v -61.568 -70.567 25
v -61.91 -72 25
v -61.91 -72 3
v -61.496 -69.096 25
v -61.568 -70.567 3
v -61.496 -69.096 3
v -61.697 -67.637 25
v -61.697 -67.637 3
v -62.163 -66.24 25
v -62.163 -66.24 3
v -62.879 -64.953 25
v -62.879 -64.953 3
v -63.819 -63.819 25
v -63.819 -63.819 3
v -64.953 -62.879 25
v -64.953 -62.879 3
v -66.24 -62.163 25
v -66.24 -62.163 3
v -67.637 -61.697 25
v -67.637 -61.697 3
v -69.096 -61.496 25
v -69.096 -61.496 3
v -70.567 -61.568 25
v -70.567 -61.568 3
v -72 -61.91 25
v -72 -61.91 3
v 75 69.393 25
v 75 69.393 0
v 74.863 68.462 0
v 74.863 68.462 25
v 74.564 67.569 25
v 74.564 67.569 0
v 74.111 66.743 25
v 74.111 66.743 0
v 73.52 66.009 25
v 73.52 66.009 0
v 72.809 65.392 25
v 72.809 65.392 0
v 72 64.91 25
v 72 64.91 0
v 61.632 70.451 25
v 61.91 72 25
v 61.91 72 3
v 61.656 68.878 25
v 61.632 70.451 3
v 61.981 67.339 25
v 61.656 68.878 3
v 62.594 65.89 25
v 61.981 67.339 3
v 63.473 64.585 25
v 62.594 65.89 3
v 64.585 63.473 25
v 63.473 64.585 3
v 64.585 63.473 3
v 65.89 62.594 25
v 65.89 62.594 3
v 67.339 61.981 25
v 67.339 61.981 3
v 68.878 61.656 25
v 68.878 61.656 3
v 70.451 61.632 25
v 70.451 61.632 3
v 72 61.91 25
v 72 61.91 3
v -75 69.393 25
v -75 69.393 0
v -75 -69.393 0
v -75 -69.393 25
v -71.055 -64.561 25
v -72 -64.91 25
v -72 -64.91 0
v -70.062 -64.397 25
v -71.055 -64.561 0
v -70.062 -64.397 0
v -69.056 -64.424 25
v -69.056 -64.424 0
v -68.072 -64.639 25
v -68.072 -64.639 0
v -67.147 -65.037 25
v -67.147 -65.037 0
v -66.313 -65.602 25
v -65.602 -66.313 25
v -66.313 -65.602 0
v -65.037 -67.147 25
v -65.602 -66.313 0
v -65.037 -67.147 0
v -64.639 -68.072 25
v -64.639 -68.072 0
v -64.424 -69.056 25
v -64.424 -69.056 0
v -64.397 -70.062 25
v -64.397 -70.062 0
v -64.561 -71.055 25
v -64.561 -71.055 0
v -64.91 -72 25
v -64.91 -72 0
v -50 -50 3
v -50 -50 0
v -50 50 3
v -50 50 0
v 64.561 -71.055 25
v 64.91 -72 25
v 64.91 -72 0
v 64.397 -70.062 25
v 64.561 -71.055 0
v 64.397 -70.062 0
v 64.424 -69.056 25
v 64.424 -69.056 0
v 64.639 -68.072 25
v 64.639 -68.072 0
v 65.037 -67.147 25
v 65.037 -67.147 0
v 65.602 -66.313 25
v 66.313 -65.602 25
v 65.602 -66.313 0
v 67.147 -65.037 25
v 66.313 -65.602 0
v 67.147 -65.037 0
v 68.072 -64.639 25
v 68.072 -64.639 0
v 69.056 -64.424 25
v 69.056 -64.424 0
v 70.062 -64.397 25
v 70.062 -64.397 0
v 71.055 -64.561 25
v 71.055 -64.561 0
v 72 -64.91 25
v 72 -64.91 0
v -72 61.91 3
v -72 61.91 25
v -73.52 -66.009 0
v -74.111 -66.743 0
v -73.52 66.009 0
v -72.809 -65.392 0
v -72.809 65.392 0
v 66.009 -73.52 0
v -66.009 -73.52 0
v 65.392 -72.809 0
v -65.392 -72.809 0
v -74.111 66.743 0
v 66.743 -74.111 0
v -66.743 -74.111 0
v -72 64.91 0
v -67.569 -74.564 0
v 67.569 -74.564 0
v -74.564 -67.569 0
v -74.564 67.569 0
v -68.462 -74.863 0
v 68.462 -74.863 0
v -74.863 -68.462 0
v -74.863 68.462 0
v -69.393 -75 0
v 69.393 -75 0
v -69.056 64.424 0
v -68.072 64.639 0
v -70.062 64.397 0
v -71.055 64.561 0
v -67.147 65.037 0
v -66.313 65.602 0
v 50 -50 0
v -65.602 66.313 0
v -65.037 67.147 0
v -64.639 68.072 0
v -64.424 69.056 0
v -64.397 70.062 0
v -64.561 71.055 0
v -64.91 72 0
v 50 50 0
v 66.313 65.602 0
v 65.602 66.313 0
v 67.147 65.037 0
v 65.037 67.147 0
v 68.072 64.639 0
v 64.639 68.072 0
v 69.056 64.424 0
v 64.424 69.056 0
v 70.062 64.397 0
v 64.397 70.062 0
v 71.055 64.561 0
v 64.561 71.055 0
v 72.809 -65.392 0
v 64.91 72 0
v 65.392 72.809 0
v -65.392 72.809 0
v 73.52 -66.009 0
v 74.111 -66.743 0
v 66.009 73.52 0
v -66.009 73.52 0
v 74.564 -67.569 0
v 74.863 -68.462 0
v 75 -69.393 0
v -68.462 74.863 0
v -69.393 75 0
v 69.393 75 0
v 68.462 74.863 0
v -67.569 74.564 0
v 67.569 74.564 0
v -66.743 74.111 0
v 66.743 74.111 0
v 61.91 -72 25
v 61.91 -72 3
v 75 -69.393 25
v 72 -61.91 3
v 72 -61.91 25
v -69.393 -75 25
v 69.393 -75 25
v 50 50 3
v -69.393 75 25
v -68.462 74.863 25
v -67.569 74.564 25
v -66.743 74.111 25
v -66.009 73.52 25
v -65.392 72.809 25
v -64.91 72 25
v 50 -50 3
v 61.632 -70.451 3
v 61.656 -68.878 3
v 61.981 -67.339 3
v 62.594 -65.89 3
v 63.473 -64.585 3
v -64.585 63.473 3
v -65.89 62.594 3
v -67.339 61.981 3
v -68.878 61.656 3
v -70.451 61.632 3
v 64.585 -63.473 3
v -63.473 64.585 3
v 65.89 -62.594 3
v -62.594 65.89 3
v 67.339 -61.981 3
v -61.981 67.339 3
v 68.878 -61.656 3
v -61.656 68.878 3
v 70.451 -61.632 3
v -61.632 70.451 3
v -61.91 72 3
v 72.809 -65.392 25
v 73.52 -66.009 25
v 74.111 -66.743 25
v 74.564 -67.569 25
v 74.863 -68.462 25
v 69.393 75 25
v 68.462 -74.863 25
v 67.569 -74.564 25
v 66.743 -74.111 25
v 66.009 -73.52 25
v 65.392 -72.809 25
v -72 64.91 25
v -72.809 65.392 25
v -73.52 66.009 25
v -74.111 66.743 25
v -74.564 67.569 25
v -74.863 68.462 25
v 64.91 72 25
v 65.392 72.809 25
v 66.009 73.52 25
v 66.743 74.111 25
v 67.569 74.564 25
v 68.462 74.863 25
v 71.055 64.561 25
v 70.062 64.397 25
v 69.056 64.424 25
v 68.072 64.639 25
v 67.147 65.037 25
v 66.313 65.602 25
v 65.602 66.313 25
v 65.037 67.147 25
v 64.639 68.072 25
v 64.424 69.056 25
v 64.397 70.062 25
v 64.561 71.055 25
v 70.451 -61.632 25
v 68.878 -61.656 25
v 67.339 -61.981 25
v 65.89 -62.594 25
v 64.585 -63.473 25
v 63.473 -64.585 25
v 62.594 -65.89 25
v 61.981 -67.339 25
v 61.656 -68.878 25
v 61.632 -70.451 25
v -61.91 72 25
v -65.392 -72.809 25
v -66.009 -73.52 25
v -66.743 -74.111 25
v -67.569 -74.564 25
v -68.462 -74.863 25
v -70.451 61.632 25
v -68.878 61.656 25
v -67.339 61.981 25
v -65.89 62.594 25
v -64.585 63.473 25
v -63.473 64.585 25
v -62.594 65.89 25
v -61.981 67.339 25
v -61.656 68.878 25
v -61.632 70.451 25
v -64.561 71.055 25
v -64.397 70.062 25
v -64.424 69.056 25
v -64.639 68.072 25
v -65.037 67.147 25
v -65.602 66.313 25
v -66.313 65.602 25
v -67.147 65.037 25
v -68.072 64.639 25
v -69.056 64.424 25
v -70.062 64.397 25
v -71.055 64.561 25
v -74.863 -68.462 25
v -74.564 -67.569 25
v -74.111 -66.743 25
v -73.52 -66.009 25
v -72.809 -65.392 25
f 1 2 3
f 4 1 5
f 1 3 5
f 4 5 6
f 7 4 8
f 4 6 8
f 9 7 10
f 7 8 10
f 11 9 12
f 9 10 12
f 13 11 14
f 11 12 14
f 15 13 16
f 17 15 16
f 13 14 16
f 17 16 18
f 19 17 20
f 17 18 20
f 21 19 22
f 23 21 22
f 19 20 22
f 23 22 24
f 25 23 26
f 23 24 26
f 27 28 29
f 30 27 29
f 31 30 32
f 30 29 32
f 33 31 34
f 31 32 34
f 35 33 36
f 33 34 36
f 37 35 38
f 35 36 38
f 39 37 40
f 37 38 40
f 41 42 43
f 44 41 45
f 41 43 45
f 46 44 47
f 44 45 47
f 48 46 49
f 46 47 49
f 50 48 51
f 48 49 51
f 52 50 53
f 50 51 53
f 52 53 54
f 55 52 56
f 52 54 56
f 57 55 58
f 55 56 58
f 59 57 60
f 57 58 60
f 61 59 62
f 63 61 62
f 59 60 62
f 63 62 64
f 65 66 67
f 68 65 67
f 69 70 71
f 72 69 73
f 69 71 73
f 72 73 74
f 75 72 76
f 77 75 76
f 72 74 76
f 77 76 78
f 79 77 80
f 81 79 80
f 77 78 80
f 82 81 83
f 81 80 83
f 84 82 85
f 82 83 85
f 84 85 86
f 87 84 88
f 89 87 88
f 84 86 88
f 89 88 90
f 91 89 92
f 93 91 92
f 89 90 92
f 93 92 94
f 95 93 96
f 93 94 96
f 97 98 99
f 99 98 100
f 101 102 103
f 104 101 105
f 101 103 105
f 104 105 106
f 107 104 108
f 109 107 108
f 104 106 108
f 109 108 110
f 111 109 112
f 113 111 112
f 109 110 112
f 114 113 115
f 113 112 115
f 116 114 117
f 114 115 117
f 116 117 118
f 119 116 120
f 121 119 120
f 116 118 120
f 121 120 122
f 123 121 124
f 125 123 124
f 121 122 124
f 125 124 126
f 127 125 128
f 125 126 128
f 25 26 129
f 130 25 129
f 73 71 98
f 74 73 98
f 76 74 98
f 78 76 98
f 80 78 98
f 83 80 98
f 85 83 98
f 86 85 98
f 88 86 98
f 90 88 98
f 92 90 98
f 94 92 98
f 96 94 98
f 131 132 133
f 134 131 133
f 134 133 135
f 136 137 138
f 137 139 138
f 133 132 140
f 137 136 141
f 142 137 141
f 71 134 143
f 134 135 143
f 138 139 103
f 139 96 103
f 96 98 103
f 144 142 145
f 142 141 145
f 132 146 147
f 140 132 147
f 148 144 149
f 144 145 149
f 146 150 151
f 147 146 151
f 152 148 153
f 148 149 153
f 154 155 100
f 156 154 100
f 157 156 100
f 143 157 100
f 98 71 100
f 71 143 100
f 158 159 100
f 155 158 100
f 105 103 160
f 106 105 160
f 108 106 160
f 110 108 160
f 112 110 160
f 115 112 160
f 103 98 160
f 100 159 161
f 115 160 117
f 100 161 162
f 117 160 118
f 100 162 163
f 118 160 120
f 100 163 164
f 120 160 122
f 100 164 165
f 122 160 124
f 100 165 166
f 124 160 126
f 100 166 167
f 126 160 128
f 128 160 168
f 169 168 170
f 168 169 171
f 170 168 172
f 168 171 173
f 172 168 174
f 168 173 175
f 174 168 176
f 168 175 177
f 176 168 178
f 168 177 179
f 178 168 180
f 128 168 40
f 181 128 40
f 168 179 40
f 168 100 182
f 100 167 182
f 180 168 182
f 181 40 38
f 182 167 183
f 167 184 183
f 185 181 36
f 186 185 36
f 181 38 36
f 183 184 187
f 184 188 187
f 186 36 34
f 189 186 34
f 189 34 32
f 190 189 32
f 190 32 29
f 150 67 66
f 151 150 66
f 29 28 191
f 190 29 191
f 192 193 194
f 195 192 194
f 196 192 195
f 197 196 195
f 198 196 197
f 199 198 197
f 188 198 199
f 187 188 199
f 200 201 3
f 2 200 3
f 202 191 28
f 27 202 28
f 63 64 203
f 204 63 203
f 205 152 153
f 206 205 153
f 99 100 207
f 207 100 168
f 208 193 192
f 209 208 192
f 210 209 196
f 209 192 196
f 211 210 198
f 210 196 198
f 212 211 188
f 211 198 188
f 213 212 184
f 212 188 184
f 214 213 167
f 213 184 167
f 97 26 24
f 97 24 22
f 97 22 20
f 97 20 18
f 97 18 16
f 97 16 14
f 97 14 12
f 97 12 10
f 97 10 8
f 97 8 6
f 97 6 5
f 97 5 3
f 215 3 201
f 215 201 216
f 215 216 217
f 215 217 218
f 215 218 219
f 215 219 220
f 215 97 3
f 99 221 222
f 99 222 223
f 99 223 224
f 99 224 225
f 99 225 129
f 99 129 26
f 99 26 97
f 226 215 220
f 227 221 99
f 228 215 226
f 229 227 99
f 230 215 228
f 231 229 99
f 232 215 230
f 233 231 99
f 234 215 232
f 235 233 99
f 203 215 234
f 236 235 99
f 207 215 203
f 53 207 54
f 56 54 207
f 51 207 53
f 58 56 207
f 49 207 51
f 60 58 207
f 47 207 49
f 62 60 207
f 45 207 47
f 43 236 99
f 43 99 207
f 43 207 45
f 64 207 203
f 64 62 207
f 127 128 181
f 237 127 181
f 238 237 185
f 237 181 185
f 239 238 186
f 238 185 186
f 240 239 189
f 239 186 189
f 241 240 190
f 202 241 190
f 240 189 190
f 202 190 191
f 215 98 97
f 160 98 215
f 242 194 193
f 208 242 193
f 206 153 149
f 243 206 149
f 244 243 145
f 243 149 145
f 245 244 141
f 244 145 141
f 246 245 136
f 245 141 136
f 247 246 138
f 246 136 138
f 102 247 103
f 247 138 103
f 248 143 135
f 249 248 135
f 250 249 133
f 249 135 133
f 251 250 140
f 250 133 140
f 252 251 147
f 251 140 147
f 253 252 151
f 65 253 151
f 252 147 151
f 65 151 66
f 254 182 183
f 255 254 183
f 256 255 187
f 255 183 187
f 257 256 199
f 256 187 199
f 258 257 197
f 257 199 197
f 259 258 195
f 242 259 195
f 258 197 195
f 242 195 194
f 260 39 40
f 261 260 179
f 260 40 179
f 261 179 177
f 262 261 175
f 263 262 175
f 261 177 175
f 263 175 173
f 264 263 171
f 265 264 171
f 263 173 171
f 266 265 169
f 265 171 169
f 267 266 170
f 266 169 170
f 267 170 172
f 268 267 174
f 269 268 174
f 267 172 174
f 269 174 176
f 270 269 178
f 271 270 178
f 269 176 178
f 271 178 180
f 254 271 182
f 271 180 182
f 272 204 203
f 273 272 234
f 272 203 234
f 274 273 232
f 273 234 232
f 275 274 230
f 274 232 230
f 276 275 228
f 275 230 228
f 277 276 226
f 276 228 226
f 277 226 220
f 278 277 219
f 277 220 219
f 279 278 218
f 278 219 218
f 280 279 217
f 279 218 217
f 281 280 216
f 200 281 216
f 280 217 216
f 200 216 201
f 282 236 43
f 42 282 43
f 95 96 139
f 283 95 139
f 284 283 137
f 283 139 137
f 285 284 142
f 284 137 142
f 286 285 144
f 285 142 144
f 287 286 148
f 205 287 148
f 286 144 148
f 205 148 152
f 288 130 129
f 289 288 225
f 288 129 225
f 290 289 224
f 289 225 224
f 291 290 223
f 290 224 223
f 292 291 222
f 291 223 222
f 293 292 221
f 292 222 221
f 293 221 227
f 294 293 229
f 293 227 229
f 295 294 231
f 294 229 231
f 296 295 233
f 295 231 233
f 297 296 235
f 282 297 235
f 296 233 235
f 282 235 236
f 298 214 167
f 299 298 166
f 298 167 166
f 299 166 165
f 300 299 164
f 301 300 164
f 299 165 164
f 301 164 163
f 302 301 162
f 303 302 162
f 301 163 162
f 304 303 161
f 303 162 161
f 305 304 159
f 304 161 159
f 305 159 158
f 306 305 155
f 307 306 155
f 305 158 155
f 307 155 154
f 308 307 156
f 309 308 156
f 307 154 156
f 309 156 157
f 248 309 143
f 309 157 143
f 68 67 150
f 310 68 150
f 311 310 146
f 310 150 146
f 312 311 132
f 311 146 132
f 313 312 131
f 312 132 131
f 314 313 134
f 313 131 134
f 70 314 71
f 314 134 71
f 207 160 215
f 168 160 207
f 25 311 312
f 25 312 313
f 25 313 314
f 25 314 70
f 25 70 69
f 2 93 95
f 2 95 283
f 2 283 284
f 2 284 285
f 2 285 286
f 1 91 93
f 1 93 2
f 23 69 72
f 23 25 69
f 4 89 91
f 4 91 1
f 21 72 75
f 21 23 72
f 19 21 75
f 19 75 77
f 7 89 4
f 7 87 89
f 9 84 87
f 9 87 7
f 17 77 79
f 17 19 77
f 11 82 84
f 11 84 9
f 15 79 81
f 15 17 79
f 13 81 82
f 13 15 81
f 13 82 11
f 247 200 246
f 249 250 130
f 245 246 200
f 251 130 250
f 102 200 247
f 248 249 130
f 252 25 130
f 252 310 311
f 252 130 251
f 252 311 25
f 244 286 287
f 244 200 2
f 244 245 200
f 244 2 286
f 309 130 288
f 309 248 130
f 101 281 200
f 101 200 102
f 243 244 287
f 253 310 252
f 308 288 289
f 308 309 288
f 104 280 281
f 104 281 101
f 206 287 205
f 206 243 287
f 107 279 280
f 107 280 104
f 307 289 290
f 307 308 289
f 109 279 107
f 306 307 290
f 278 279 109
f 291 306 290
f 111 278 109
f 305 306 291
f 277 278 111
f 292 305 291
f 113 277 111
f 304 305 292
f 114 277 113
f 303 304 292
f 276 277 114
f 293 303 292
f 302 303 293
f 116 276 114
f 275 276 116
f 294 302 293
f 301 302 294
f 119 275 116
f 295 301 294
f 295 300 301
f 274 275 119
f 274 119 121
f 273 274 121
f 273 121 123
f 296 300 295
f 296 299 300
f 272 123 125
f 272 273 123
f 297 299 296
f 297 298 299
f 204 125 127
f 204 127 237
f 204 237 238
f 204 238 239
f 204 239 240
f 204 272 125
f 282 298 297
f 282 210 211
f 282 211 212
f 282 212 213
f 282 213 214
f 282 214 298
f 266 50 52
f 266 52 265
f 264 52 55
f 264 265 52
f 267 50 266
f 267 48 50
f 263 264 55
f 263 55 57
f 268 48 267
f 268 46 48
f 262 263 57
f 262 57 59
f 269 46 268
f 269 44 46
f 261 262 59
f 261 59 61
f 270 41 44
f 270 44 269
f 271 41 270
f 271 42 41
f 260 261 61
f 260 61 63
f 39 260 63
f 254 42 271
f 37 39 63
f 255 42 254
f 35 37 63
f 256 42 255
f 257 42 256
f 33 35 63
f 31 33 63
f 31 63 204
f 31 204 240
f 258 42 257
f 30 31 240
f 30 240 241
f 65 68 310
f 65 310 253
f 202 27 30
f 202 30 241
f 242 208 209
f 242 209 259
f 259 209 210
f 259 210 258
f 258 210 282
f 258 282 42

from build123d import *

# Parameters (mm, degrees)
F1_DEPTH = 25
F0_W     = 100
F0_H     = 100
F2_DEPTH = 3


with BuildPart() as f1:
    # F0 (on Top) → F1 (new body)
    with BuildSketch(Plane.XY):
        with BuildLine():
            ThreePointArc((-72, 64.9100722949), (-74.1114641858, 66.7425764269), (-75, 69.3933982822))
            Line((-75, 69.3933982822), (-75, -69.3933982822))
            ThreePointArc((-75, -69.3933982822), (-74.1114641858, -66.7425764269), (-72, -64.9100722949))
            Line((-72, -64.9100722949), (-72, -61.9100722949))
            Line((-72, -61.9100722949), (-72, 61.9100722949))
            Line((-72, 61.9100722949), (-72, 64.9100722949))
        make_face()
        with BuildLine():
            Line((-61.9100722949, 72), (-64.9100722949, 72))
            ThreePointArc((-64.9100722949, 72), (-65.9405713869, 65.9405713869), (-72, 64.9100722949))
            Line((-72, 64.9100722949), (-72, 61.9100722949))
            ThreePointArc((-72, 61.9100722949), (-64.0021028341, 64.0021028341), (-61.9100722949, 72))
        make_face()
        with BuildLine():
            Line((69.3933982822, 75), (-69.3933982822, 75))
            ThreePointArc((-69.3933982822, 75), (-66.7425764269, 74.1114641858), (-64.9100722949, 72))
            Line((-64.9100722949, 72), (-61.9100722949, 72))
            Line((-61.9100722949, 72), (61.9100722949, 72))
            Line((61.9100722949, 72), (64.9100722949, 72))
            ThreePointArc((64.9100722949, 72), (66.7425764269, 74.1114641858), (69.3933982822, 75))
        make_face()
        with BuildLine():
            ThreePointArc((72, 64.9100722949), (65.9405713869, 65.9405713869), (64.9100722949, 72))
            Line((64.9100722949, 72), (61.9100722949, 72))
            ThreePointArc((61.9100722949, 72), (64.0021028341, 64.0021028341), (72, 61.9100722949))
            Line((72, 61.9100722949), (72, 64.9100722949))
        make_face()
        with BuildLine():
            ThreePointArc((75, 69.3933982822), (74.1114641858, 66.7425764269), (72, 64.9100722949))
            Line((72, 64.9100722949), (72, 61.9100722949))
            Line((72, 61.9100722949), (72, -61.9100722949))
            Line((72, -61.9100722949), (72, -64.9100722949))
            ThreePointArc((72, -64.9100722949), (74.1114641858, -66.7425764269), (75, -69.3933982822))
            Line((75, -69.3933982822), (75, 69.3933982822))
        make_face()
        with BuildLine():
            Line((72, -64.9100722949), (72, -61.9100722949))
            ThreePointArc((72, -61.9100722949), (64.0021028341, -64.0021028341), (61.9100722949, -72))
            Line((61.9100722949, -72), (64.9100722949, -72))
            ThreePointArc((64.9100722949, -72), (65.9405713869, -65.9405713869), (72, -64.9100722949))
        make_face()
        with BuildLine():
            Line((-61.9100722949, -72), (-64.9100722949, -72))
            ThreePointArc((-64.9100722949, -72), (-66.7425764269, -74.1114641858), (-69.3933982822, -75))
            Line((-69.3933982822, -75), (69.3933982822, -75))
            ThreePointArc((69.3933982822, -75), (66.7425764269, -74.1114641858), (64.9100722949, -72))
            Line((64.9100722949, -72), (61.9100722949, -72))
            Line((61.9100722949, -72), (-61.9100722949, -72))
        make_face()
        with BuildLine():
            Line((-72, -61.9100722949), (-72, -64.9100722949))
            ThreePointArc((-72, -64.9100722949), (-65.9405713869, -65.9405713869), (-64.9100722949, -72))
            Line((-64.9100722949, -72), (-61.9100722949, -72))
            ThreePointArc((-61.9100722949, -72), (-63.8192510434, -63.8192510434), (-72, -61.9100722949))
        make_face()
    extrude(amount=F1_DEPTH)

    # F0 (on Top) → F2 (join)
    with BuildSketch(Plane.XY):
        with BuildLine():
            Line((61.9100722949, 72), (-61.9100722949, 72))
            ThreePointArc((-61.9100722949, 72), (-64.0021028341, 64.0021028341), (-72, 61.9100722949))
            Line((-72, 61.9100722949), (-72, -61.9100722949))
            ThreePointArc((-72, -61.9100722949), (-63.8192510434, -63.8192510434), (-61.9100722949, -72))
            Line((-61.9100722949, -72), (61.9100722949, -72))
            ThreePointArc((61.9100722949, -72), (64.0021028341, -64.0021028341), (72, -61.9100722949))
            Line((72, -61.9100722949), (72, 61.9100722949))
            ThreePointArc((72, 61.9100722949), (64.0021028341, 64.0021028341), (61.9100722949, 72))
        make_face()
        Rectangle(F0_W, F0_H, mode=Mode.SUBTRACT)
    extrude(amount=F2_DEPTH)


solid = f1.part
